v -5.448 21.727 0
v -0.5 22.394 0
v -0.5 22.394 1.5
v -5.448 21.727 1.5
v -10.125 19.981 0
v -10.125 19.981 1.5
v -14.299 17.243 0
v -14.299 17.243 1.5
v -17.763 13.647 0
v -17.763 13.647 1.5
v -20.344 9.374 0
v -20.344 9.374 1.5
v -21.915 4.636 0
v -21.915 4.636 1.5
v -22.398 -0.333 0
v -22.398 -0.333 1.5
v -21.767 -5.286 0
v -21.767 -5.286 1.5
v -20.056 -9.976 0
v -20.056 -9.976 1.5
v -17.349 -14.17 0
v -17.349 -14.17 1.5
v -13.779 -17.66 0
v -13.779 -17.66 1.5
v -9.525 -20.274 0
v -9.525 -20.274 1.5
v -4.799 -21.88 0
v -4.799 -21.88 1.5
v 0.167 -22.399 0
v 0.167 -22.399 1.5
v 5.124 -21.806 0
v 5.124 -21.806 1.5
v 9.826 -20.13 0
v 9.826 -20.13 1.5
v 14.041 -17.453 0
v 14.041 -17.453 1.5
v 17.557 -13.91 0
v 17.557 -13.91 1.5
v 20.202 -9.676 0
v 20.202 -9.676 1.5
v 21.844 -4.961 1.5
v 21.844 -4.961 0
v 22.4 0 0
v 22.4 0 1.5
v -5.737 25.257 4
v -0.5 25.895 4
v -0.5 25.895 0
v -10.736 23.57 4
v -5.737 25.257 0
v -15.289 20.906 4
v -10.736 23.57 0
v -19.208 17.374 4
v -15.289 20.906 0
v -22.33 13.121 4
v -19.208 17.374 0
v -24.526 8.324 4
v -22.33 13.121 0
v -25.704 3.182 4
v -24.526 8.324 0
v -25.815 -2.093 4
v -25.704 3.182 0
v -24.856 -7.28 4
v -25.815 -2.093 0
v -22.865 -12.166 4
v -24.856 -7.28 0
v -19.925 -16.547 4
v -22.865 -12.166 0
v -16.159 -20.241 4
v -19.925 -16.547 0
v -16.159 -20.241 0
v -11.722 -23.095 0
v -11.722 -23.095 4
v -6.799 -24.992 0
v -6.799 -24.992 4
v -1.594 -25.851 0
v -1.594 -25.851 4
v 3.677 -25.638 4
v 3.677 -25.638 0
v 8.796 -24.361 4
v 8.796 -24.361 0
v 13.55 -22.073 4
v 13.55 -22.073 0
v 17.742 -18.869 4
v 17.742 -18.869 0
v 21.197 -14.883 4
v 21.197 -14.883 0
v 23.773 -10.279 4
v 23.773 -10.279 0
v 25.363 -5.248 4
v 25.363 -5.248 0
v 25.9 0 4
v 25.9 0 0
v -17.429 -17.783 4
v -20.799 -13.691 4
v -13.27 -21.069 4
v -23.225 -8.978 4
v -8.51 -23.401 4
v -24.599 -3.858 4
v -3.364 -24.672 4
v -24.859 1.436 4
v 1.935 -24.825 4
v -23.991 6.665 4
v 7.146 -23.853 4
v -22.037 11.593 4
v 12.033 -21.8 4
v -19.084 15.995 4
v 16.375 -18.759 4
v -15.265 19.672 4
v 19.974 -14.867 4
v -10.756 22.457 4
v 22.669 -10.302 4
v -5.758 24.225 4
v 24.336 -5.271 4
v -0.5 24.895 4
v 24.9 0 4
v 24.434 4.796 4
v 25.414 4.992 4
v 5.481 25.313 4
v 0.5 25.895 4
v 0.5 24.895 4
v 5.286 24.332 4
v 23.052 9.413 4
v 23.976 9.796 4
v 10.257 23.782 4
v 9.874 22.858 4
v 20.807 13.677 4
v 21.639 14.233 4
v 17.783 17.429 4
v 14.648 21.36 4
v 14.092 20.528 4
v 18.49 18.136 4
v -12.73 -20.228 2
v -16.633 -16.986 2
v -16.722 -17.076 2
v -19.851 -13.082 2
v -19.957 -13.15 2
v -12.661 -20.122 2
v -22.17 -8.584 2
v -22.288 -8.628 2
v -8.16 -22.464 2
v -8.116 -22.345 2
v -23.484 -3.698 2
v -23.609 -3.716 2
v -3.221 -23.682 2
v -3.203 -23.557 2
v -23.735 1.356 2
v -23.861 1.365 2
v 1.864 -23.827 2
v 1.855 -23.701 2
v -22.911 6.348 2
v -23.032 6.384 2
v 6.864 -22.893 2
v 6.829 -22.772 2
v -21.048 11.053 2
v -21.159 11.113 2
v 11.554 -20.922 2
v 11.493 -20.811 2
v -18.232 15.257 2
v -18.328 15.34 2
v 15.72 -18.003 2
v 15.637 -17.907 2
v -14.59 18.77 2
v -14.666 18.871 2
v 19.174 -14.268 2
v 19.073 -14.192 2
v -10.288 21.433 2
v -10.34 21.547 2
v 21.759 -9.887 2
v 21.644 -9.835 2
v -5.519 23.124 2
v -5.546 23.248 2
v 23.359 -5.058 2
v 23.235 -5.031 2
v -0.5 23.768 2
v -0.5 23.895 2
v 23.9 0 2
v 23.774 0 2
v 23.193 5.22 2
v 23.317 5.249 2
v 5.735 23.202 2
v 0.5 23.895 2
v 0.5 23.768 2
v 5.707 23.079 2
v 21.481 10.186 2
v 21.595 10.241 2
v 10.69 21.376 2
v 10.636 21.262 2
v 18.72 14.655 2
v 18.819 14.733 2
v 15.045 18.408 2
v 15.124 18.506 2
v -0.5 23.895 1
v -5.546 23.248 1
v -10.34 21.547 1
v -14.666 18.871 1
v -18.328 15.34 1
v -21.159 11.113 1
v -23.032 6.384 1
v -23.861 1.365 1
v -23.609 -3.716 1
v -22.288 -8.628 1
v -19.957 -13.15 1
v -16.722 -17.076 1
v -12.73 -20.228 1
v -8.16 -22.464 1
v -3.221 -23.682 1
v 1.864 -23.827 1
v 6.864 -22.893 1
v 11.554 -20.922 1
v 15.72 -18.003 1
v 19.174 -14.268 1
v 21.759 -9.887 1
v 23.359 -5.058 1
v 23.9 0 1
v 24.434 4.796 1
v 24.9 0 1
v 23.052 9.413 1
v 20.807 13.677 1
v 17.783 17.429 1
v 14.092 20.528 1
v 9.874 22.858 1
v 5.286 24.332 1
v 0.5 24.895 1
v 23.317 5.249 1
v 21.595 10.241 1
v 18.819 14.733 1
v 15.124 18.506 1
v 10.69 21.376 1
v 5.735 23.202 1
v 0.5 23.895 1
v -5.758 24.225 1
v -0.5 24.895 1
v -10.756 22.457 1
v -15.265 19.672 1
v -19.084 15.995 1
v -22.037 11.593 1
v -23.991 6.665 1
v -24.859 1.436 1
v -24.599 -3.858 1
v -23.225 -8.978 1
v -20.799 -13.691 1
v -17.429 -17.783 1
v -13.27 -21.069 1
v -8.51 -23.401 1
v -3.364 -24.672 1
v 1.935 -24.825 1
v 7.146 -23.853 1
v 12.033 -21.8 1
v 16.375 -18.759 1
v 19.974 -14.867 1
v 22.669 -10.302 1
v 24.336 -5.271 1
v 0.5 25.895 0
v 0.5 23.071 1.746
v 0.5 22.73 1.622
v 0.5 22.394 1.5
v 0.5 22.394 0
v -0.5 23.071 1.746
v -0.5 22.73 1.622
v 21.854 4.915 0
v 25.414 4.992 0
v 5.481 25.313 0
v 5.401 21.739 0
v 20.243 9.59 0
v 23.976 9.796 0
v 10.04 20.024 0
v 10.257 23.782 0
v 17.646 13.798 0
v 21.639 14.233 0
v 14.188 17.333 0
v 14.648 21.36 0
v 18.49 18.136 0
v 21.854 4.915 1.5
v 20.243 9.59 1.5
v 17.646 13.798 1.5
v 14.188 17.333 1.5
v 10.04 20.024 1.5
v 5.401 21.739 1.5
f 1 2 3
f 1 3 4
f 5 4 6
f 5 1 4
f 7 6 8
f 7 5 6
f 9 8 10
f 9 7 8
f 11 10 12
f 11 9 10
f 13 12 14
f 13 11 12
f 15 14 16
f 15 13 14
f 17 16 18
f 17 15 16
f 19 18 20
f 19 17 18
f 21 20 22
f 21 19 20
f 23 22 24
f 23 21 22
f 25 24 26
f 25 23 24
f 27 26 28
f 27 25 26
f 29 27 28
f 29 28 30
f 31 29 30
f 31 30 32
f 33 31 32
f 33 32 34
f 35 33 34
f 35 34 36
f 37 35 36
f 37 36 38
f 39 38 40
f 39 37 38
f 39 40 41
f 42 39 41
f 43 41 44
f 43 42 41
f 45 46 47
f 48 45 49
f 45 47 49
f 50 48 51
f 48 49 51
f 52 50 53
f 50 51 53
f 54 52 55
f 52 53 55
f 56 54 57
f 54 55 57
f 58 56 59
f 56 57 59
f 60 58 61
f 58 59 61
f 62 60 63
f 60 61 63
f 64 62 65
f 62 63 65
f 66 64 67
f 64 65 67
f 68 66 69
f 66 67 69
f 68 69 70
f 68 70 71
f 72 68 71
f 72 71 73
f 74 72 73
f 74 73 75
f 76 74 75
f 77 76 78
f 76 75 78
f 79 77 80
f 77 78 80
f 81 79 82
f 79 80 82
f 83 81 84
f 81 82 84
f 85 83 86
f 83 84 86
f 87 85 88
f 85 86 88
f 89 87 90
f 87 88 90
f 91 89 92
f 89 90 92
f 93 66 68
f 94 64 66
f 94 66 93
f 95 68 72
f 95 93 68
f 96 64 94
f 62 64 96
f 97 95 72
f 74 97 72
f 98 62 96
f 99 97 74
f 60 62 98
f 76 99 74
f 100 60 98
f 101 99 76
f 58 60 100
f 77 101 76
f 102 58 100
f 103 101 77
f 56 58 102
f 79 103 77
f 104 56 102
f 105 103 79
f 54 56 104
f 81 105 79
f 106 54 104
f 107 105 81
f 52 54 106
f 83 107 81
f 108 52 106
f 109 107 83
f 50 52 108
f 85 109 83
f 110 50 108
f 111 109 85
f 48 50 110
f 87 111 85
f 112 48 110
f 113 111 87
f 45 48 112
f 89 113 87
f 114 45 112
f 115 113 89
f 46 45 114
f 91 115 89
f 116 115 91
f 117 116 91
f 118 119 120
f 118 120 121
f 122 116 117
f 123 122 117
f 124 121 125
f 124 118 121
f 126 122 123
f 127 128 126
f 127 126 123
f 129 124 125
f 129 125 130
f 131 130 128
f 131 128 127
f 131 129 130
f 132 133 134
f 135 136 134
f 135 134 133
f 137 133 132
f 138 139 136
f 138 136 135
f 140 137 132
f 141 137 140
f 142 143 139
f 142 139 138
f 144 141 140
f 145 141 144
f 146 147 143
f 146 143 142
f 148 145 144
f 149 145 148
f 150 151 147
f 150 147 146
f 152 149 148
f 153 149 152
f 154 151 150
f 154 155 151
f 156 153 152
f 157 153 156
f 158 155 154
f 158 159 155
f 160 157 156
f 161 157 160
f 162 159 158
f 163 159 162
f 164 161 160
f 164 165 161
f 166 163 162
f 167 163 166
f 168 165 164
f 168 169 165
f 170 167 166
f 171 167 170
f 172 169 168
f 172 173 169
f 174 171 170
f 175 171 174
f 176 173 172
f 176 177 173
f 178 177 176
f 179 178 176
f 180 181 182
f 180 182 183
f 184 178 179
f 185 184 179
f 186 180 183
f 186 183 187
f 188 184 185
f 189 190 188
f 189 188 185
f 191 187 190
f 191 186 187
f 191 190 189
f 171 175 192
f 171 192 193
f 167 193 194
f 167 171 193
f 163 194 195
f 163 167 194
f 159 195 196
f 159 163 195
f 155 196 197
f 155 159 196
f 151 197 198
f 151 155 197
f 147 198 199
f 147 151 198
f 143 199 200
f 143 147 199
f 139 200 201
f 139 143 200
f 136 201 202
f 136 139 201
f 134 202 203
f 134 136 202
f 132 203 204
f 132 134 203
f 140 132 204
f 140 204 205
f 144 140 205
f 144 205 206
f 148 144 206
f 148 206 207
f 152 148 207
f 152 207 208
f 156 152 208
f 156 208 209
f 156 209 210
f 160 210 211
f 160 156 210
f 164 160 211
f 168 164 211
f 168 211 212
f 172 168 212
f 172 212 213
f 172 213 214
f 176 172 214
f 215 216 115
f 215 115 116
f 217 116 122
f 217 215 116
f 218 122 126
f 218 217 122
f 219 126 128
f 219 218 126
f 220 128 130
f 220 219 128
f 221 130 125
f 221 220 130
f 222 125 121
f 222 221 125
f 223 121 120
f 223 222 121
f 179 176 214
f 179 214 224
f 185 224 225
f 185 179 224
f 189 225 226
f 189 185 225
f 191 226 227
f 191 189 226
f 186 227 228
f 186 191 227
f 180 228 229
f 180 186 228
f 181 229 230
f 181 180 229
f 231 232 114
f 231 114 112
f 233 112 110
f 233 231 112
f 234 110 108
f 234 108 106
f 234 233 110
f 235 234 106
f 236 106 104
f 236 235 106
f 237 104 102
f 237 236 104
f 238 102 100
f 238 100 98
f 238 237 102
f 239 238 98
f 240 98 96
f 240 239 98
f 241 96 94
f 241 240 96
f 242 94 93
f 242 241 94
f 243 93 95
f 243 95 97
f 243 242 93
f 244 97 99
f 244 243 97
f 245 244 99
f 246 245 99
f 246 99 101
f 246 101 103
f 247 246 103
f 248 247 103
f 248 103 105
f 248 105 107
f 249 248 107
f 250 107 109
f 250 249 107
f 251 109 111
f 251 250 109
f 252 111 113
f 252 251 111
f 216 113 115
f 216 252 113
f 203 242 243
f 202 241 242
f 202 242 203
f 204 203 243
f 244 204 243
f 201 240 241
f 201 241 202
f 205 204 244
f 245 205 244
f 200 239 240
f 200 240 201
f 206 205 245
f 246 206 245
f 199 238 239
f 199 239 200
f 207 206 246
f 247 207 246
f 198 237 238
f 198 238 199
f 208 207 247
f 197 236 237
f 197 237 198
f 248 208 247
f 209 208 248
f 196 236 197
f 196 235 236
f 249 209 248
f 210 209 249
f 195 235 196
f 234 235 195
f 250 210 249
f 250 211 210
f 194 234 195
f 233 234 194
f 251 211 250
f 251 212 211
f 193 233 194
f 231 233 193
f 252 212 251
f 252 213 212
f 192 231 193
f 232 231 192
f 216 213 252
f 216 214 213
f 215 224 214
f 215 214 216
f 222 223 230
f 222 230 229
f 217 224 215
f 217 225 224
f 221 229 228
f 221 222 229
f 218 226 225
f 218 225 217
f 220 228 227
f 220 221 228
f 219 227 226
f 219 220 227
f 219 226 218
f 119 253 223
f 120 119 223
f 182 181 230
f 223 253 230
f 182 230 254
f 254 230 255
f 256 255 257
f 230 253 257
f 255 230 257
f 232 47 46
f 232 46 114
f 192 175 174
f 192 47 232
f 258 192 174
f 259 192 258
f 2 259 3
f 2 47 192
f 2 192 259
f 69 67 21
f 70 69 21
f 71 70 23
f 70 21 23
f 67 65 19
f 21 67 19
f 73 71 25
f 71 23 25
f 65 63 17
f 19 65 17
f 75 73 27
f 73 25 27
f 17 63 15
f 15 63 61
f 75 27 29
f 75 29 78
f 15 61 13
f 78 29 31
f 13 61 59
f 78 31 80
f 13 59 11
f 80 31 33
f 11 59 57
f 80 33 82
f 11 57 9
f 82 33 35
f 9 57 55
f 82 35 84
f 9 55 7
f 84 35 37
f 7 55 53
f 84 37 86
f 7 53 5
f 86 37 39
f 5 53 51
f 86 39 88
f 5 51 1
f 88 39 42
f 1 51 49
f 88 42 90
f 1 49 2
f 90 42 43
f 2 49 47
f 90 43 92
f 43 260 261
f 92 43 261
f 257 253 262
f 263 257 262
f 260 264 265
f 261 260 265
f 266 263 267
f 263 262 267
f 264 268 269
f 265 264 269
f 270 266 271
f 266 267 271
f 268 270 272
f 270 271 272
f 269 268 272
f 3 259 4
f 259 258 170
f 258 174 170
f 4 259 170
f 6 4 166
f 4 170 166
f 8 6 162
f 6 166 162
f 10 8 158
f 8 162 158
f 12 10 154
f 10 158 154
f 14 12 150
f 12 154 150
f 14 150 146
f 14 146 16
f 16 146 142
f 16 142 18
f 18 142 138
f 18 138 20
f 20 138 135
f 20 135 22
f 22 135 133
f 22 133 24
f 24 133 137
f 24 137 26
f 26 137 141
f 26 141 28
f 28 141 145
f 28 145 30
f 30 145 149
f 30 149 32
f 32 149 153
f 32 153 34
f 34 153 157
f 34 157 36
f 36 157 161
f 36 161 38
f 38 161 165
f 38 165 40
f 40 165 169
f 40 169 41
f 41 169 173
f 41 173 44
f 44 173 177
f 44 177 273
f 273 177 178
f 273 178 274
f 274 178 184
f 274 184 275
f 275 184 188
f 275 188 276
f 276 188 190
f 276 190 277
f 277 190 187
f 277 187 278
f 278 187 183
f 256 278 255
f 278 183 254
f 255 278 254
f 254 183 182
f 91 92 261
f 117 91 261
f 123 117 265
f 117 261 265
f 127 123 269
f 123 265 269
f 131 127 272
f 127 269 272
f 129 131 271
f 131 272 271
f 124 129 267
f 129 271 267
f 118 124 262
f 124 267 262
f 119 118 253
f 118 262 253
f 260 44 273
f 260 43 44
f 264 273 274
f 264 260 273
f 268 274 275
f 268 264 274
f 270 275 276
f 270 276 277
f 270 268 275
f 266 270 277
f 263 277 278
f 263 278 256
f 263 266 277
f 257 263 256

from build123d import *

# Parameters (mm, degrees)
F0_R     = 25.9
F0_R_2   = 22.4
F1_DEPTH = 2
F2_R     = 25.9
F2_R_2   = 24.9
F3_DEPTH = 2
F4_W     = 1
F4_H     = 10
F5_DEPTH = 25
F6_R     = 24.9
F6_R_2   = 23.9
F7_DEPTH = 1
F8_SIZE2 = 1.373739
F8_SIZE  = 0.5


with BuildPart() as f1:
    # F0 (on Top) → F1 (new body)
    with BuildSketch(Plane.XY):
        Circle(F0_R)
        Circle(F0_R_2, mode=Mode.SUBTRACT)
    extrude(amount=F1_DEPTH)

    # F2 (on face) → F3 (join)
    with BuildSketch(Plane.XY.offset(2)):
        Circle(F2_R)
        Circle(F2_R_2, mode=Mode.SUBTRACT)
    extrude(amount=F3_DEPTH)

    # F4 (on face) → F5 (cut)
    with BuildSketch(Plane(origin=(0, 0, 0), x_dir=(1, 0, 0), z_dir=(0, 0, -1))):
        with Locations((0, -25)):
            Rectangle(F4_W, F4_H)
    extrude(amount=-F5_DEPTH, mode=Mode.SUBTRACT)

    # F6 (on face) → F7 (cut)
    with BuildSketch(Plane.XY.offset(2)):
        Circle(F6_R)
        Circle(F6_R_2, mode=Mode.SUBTRACT)
    extrude(amount=-F7_DEPTH, mode=Mode.SUBTRACT)

    # F8
    f8_edges = [f1.edges().sort_by_distance(p)[0] for p in [
        (-15.661418, -16.014993, 2),
    ]]
    chamfer(f8_edges, length=F8_SIZE, length2=F8_SIZE2)


solid = f1.part
